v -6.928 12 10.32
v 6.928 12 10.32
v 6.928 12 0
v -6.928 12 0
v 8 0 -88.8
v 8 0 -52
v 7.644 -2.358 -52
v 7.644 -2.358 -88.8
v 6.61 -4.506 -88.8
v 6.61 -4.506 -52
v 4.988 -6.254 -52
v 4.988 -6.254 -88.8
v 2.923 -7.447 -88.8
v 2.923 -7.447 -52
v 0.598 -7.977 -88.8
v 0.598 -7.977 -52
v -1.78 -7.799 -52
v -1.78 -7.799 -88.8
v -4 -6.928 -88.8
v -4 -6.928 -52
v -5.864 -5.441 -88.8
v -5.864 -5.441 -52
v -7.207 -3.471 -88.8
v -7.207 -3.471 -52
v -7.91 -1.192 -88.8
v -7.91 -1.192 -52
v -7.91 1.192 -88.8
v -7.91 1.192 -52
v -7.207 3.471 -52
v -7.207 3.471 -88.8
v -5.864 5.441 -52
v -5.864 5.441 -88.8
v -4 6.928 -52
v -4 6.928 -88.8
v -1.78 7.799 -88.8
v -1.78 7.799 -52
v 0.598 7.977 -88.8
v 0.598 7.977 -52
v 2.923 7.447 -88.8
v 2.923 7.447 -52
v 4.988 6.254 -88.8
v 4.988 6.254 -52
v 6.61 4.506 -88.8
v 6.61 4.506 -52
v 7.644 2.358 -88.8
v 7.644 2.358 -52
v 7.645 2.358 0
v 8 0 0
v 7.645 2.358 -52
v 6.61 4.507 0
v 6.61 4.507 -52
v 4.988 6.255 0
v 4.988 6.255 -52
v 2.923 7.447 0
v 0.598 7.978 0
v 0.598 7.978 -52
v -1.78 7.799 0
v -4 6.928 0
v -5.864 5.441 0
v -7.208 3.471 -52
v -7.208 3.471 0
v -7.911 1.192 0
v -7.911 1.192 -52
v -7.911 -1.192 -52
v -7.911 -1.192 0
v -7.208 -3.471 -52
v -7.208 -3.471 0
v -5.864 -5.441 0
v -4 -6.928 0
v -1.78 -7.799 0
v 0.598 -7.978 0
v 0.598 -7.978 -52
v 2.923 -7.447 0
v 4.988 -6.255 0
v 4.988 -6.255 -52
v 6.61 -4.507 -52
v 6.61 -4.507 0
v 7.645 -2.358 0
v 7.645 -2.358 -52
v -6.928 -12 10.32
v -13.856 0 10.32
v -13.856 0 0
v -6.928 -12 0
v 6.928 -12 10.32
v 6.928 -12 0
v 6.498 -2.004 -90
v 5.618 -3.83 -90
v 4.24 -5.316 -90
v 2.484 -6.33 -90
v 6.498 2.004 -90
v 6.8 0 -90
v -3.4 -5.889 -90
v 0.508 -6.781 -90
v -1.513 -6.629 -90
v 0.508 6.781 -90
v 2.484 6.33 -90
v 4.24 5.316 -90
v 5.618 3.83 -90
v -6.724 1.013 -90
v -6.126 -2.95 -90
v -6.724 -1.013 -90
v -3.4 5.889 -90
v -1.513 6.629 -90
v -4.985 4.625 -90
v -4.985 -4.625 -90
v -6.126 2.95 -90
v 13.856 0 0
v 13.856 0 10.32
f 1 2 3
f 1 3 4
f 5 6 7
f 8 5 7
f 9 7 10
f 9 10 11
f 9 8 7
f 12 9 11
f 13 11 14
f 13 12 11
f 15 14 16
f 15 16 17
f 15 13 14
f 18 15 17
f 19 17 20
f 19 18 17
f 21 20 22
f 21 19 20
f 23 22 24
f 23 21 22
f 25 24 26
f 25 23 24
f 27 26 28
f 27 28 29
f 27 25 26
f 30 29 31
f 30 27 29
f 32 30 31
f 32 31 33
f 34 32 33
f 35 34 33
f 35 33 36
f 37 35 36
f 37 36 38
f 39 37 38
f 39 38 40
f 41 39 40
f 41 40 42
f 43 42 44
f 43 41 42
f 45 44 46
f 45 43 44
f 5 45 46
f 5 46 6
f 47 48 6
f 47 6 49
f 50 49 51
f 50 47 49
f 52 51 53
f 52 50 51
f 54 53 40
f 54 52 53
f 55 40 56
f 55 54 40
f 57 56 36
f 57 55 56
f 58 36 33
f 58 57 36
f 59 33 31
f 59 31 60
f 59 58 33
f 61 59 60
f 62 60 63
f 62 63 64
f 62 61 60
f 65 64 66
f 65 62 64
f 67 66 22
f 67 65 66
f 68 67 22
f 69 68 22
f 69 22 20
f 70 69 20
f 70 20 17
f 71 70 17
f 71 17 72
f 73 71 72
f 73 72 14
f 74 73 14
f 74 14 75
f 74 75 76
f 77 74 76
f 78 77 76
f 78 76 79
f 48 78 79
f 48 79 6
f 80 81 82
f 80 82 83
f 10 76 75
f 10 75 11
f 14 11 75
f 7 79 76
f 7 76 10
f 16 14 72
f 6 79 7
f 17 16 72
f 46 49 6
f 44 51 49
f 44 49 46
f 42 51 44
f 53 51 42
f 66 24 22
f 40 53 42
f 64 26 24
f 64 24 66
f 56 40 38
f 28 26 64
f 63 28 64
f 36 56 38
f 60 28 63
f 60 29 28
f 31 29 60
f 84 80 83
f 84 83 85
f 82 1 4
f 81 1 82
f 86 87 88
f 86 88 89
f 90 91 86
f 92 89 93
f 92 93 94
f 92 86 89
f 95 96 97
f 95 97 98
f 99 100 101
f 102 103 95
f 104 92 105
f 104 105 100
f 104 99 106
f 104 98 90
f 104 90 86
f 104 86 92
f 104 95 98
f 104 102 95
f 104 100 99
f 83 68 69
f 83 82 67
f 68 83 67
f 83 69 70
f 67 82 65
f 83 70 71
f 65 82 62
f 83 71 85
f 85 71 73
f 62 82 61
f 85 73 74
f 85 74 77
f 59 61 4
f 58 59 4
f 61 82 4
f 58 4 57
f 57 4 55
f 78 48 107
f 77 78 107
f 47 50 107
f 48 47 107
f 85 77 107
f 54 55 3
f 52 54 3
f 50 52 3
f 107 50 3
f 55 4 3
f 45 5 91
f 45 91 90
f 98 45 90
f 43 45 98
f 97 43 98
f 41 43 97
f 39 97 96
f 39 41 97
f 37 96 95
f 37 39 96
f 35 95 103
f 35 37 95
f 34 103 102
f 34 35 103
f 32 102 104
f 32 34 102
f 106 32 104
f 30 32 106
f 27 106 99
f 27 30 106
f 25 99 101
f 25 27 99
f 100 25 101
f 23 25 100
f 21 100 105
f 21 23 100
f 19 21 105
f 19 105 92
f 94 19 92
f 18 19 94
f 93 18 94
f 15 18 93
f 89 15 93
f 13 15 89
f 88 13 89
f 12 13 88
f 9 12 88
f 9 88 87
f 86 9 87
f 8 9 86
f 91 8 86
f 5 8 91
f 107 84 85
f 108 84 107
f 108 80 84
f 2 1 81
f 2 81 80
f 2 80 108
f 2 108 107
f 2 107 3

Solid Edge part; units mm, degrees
sketch "Sketch1" plane through (0, 0, 0) normal (0, 0, 1) x (1, 0, 0)
  circle A0 centre (0, 0) radius 13.92
  dimension "D1" = 27.84
extrude "Protrusion1" add sketch "Sketch1" along normal blind 10.32
sketch "Sketch2" plane through (0, 0, 0) normal (0, 0, -1) x (1, 0, 0)
  circle A0 centre (0, 0) radius 8
extrude "Protrusion2" add sketch "Sketch2" along normal blind 90
sketch "Sketch3" plane through (0, 0, -90) normal (0, 0, -1) x (1, 0, 0)
  circle A0 centre (0, 0) radius 7.9997
extrude "Cutout1" cut sketch "Sketch3" against normal blind 38 flip side to cut
chamfer "Chamfer_1" distance 1.2 angle 45 1 edges at (-7.9997, 0, -90)
sketch "Sketch4" plane through (0, 0, 10.32) normal (0, 0, 1) x (1, 0, 0)
  line L0 (-7.0545, 12) -> (7.0545, 12)
  dimension "D1" = 24
extrude "Cutout2" cut sketch "Sketch4" against normal up to next material side at (0, 12.05, 10.32)
pattern_circular "Pattern1" count 6 over 360 about axis through (0, 0, 10.32) along (0, 0, 1) of "Cutout2"
properties part number "118589" material "Stainless Steel, 304"
